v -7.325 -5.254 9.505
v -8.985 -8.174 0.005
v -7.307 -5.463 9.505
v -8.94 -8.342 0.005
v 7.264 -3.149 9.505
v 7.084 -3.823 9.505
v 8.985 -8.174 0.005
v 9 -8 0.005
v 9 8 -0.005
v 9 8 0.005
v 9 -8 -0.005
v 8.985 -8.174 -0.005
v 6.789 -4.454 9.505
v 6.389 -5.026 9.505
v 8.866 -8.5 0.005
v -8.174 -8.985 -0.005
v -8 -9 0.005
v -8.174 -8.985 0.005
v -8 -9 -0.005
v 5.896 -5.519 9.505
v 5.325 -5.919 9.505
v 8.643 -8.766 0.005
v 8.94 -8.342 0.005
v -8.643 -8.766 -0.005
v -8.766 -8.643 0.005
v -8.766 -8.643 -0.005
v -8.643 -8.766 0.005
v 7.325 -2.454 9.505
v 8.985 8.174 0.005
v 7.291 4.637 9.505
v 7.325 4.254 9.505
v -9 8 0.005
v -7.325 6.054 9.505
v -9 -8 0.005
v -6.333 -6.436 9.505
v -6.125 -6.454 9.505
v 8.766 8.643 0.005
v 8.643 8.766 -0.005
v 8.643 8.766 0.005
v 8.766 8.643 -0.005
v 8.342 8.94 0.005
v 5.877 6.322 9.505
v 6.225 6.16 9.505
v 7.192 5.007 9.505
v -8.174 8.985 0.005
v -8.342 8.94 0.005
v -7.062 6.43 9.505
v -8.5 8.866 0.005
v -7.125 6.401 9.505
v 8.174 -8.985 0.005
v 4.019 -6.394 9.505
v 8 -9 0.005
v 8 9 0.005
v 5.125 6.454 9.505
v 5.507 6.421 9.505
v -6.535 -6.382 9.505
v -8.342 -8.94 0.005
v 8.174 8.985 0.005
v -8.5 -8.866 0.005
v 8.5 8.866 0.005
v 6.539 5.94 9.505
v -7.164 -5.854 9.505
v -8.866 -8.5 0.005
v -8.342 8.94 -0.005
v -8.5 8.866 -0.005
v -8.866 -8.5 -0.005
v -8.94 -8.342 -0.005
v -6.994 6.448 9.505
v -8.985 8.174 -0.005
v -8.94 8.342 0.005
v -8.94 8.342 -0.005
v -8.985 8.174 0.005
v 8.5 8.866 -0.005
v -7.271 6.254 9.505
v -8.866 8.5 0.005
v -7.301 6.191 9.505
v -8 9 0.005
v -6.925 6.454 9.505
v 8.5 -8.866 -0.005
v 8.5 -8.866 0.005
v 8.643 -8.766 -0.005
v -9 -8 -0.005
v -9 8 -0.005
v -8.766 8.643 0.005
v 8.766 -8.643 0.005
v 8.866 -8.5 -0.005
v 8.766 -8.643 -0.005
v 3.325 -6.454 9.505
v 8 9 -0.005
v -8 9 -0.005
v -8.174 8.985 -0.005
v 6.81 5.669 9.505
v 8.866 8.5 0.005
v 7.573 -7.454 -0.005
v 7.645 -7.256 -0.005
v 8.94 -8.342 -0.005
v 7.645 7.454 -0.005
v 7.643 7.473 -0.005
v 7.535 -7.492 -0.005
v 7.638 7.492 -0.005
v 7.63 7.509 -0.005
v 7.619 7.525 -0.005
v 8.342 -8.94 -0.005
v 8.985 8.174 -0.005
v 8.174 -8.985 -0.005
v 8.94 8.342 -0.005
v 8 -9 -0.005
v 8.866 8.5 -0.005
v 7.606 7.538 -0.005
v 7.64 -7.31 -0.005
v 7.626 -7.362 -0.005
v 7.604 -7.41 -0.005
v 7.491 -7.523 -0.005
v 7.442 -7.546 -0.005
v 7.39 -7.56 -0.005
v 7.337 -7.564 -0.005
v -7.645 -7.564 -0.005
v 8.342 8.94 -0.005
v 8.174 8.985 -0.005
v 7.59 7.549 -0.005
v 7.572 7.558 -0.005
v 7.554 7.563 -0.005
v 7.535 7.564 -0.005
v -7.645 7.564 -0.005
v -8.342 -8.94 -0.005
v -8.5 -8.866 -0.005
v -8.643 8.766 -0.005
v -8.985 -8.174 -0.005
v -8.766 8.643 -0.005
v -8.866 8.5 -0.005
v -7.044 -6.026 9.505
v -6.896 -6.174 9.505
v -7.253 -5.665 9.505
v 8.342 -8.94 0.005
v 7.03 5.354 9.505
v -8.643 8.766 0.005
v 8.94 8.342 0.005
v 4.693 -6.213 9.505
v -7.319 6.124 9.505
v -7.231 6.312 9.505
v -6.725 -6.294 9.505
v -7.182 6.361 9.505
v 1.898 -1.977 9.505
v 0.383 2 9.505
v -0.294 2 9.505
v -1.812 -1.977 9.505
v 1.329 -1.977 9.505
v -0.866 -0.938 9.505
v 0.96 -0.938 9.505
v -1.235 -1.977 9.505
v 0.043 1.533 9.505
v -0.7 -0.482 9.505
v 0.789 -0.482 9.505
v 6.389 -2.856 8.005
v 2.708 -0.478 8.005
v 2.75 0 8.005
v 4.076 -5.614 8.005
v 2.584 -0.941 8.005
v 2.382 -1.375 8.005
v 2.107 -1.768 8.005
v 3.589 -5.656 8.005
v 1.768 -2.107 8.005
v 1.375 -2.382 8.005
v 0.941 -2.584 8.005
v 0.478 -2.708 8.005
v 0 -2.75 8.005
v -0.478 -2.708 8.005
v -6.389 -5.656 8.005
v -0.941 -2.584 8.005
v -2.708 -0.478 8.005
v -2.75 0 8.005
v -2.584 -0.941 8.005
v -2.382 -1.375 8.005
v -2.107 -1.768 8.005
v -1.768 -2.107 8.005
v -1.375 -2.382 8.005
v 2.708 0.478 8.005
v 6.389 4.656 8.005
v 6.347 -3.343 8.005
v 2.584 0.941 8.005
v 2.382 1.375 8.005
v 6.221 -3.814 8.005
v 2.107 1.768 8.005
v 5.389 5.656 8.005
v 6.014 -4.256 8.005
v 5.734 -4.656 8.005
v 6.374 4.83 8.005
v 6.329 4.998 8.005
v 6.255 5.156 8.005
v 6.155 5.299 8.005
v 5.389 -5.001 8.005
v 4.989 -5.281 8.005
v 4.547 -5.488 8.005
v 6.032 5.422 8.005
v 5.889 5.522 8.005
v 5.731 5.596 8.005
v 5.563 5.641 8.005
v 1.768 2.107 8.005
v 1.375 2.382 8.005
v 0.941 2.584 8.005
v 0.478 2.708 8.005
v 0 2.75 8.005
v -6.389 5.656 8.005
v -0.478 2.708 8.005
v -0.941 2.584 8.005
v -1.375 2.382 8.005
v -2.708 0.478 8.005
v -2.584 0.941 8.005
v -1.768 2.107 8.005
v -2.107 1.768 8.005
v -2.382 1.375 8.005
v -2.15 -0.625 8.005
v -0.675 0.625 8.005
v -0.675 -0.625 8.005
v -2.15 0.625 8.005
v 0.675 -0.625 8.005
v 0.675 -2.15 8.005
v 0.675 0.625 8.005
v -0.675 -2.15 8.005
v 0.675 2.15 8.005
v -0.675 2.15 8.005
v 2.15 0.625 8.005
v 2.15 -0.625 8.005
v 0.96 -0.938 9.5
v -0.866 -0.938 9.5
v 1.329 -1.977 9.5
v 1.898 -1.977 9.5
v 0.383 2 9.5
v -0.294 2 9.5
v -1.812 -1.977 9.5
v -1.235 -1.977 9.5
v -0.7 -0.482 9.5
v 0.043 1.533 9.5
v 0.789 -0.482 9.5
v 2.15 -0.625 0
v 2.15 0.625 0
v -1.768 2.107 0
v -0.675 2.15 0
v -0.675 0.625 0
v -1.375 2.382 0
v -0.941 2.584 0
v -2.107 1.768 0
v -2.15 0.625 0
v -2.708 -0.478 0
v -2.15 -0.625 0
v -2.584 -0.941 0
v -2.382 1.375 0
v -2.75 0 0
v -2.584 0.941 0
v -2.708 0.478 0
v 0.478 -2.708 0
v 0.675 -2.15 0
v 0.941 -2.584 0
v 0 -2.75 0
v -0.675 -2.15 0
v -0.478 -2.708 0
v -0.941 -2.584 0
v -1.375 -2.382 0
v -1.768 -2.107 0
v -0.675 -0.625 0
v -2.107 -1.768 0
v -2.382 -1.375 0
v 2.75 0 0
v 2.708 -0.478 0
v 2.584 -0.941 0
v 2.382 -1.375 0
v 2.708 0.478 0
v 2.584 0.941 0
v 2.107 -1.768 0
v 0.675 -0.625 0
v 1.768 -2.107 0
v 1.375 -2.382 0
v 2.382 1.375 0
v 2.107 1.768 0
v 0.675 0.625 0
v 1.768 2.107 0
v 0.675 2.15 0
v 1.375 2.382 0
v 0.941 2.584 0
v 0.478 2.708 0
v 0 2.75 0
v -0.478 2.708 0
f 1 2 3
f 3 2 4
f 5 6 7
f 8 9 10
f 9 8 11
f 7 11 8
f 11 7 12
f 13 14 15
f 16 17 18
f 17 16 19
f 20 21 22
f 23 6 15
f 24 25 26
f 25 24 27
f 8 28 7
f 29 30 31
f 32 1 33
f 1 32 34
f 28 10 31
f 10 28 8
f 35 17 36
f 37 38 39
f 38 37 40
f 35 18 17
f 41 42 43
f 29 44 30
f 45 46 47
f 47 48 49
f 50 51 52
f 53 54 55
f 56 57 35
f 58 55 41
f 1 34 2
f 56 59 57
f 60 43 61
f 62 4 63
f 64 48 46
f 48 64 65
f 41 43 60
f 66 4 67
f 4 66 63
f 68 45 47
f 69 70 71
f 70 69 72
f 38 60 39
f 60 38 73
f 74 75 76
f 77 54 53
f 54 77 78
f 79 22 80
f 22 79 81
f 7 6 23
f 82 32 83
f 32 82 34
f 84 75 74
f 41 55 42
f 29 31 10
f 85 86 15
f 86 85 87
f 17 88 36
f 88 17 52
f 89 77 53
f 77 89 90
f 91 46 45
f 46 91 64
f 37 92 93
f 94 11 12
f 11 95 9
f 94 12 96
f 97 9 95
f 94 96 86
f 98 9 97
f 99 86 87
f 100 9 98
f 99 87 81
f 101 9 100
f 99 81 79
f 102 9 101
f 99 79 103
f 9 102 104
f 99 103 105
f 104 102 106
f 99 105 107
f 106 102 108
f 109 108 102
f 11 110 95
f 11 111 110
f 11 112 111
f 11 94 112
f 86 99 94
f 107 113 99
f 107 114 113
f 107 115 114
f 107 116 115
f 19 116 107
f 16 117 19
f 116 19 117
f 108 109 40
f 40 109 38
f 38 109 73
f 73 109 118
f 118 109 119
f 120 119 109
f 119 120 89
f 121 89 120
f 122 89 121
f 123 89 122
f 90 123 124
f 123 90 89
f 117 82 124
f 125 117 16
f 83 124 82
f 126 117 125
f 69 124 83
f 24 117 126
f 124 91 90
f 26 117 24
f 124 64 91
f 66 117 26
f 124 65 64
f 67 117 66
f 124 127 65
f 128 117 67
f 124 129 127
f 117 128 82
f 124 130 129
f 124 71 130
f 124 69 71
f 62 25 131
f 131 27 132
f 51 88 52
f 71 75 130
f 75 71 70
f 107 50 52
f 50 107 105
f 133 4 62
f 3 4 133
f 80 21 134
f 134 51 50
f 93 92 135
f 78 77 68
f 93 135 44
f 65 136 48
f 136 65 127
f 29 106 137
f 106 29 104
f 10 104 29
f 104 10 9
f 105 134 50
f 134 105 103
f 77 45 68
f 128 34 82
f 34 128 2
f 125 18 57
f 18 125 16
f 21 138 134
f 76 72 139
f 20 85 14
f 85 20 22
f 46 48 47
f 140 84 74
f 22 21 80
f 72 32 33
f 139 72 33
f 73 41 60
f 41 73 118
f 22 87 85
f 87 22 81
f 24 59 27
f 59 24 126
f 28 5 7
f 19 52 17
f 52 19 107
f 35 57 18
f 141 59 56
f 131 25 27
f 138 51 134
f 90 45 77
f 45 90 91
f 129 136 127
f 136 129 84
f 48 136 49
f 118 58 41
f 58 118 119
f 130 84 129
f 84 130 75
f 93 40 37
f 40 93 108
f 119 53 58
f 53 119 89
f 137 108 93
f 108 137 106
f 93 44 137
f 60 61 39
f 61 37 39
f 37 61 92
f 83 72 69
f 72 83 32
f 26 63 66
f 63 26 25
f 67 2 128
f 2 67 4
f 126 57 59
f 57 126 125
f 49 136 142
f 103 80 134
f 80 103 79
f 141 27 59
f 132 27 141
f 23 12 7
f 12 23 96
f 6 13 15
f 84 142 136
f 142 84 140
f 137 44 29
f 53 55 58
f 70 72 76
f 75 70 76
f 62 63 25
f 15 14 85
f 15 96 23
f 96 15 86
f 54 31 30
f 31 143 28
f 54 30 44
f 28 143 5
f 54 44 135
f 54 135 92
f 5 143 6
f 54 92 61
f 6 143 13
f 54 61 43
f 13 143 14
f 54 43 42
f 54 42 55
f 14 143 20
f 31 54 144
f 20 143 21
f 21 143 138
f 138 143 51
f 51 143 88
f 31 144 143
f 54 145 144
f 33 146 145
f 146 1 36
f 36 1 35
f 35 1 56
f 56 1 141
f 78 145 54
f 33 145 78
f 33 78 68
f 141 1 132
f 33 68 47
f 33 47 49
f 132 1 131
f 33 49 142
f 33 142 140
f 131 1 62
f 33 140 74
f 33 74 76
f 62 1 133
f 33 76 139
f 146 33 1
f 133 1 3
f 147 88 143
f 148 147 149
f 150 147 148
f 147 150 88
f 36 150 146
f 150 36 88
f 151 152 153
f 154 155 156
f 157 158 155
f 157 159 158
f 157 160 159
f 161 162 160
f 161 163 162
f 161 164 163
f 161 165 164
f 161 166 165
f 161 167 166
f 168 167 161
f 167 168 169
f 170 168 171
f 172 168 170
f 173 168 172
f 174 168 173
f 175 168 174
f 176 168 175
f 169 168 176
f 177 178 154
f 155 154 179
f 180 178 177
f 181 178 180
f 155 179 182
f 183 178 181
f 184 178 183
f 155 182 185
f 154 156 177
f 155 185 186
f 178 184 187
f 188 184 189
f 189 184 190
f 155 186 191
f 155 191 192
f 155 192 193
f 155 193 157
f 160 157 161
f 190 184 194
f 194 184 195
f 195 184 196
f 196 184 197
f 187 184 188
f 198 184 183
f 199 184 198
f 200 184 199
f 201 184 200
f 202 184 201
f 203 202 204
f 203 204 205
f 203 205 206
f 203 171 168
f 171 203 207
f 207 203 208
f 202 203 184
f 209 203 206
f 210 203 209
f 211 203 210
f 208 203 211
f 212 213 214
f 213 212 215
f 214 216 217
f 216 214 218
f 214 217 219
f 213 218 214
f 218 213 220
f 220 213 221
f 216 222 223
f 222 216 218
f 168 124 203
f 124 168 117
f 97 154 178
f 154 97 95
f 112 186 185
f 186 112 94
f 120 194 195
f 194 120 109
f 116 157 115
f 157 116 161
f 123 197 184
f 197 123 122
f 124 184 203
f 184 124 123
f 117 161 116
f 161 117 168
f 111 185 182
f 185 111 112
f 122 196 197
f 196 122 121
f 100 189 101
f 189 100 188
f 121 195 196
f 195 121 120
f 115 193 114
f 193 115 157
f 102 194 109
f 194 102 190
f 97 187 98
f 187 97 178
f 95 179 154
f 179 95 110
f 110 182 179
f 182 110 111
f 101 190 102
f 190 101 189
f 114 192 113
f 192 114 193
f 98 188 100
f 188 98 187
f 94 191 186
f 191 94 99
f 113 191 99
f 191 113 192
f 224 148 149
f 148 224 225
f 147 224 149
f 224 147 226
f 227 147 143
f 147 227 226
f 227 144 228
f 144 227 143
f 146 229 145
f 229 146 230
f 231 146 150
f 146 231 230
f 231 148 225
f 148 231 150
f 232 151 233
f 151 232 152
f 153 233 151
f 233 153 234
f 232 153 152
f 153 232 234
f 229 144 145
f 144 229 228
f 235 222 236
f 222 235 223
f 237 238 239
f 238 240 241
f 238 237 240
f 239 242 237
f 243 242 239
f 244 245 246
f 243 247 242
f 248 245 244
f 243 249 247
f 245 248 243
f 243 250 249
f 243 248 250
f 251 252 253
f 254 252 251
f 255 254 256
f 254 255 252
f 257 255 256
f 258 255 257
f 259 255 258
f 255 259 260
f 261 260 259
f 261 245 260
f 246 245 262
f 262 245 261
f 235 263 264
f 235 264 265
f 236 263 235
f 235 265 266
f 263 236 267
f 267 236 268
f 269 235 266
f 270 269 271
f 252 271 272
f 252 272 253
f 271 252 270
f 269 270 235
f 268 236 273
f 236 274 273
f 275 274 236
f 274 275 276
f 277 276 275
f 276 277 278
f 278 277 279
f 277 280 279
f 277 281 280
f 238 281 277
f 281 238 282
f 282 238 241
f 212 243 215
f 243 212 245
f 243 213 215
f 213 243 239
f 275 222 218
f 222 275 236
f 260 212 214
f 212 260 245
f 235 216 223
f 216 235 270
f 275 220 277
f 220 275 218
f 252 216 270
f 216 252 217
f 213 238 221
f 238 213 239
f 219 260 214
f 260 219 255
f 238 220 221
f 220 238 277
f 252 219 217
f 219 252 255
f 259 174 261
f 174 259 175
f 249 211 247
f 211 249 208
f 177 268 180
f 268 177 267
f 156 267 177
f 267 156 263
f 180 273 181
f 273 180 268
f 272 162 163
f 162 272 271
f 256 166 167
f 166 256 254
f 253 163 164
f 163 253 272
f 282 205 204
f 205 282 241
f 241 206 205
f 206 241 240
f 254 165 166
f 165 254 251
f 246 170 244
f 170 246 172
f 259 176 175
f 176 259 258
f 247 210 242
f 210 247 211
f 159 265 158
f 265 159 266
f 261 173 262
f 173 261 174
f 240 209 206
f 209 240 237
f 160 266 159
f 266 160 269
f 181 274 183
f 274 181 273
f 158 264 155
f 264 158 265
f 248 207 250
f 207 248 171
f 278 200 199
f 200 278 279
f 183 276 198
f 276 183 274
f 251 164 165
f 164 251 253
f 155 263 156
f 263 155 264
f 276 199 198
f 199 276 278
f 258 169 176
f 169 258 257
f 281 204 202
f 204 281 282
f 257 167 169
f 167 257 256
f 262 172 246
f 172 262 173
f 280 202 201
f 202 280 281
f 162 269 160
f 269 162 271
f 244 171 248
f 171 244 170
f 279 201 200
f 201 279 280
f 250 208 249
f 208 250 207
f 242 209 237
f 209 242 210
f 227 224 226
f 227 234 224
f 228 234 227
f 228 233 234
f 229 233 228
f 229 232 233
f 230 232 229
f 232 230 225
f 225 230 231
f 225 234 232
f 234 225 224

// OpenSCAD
export_target = "preview";
include <common/custom-shell-params.scad>

user_top_corner_radius = 1.5;
user_top_corner_individual_enabled = true;
// [left_top, right_top, right_bottom, left_bottom]
user_top_corner_radii = [0.4, 2.2, 4.0, 1.2];

include <../base/keycap.scad>
